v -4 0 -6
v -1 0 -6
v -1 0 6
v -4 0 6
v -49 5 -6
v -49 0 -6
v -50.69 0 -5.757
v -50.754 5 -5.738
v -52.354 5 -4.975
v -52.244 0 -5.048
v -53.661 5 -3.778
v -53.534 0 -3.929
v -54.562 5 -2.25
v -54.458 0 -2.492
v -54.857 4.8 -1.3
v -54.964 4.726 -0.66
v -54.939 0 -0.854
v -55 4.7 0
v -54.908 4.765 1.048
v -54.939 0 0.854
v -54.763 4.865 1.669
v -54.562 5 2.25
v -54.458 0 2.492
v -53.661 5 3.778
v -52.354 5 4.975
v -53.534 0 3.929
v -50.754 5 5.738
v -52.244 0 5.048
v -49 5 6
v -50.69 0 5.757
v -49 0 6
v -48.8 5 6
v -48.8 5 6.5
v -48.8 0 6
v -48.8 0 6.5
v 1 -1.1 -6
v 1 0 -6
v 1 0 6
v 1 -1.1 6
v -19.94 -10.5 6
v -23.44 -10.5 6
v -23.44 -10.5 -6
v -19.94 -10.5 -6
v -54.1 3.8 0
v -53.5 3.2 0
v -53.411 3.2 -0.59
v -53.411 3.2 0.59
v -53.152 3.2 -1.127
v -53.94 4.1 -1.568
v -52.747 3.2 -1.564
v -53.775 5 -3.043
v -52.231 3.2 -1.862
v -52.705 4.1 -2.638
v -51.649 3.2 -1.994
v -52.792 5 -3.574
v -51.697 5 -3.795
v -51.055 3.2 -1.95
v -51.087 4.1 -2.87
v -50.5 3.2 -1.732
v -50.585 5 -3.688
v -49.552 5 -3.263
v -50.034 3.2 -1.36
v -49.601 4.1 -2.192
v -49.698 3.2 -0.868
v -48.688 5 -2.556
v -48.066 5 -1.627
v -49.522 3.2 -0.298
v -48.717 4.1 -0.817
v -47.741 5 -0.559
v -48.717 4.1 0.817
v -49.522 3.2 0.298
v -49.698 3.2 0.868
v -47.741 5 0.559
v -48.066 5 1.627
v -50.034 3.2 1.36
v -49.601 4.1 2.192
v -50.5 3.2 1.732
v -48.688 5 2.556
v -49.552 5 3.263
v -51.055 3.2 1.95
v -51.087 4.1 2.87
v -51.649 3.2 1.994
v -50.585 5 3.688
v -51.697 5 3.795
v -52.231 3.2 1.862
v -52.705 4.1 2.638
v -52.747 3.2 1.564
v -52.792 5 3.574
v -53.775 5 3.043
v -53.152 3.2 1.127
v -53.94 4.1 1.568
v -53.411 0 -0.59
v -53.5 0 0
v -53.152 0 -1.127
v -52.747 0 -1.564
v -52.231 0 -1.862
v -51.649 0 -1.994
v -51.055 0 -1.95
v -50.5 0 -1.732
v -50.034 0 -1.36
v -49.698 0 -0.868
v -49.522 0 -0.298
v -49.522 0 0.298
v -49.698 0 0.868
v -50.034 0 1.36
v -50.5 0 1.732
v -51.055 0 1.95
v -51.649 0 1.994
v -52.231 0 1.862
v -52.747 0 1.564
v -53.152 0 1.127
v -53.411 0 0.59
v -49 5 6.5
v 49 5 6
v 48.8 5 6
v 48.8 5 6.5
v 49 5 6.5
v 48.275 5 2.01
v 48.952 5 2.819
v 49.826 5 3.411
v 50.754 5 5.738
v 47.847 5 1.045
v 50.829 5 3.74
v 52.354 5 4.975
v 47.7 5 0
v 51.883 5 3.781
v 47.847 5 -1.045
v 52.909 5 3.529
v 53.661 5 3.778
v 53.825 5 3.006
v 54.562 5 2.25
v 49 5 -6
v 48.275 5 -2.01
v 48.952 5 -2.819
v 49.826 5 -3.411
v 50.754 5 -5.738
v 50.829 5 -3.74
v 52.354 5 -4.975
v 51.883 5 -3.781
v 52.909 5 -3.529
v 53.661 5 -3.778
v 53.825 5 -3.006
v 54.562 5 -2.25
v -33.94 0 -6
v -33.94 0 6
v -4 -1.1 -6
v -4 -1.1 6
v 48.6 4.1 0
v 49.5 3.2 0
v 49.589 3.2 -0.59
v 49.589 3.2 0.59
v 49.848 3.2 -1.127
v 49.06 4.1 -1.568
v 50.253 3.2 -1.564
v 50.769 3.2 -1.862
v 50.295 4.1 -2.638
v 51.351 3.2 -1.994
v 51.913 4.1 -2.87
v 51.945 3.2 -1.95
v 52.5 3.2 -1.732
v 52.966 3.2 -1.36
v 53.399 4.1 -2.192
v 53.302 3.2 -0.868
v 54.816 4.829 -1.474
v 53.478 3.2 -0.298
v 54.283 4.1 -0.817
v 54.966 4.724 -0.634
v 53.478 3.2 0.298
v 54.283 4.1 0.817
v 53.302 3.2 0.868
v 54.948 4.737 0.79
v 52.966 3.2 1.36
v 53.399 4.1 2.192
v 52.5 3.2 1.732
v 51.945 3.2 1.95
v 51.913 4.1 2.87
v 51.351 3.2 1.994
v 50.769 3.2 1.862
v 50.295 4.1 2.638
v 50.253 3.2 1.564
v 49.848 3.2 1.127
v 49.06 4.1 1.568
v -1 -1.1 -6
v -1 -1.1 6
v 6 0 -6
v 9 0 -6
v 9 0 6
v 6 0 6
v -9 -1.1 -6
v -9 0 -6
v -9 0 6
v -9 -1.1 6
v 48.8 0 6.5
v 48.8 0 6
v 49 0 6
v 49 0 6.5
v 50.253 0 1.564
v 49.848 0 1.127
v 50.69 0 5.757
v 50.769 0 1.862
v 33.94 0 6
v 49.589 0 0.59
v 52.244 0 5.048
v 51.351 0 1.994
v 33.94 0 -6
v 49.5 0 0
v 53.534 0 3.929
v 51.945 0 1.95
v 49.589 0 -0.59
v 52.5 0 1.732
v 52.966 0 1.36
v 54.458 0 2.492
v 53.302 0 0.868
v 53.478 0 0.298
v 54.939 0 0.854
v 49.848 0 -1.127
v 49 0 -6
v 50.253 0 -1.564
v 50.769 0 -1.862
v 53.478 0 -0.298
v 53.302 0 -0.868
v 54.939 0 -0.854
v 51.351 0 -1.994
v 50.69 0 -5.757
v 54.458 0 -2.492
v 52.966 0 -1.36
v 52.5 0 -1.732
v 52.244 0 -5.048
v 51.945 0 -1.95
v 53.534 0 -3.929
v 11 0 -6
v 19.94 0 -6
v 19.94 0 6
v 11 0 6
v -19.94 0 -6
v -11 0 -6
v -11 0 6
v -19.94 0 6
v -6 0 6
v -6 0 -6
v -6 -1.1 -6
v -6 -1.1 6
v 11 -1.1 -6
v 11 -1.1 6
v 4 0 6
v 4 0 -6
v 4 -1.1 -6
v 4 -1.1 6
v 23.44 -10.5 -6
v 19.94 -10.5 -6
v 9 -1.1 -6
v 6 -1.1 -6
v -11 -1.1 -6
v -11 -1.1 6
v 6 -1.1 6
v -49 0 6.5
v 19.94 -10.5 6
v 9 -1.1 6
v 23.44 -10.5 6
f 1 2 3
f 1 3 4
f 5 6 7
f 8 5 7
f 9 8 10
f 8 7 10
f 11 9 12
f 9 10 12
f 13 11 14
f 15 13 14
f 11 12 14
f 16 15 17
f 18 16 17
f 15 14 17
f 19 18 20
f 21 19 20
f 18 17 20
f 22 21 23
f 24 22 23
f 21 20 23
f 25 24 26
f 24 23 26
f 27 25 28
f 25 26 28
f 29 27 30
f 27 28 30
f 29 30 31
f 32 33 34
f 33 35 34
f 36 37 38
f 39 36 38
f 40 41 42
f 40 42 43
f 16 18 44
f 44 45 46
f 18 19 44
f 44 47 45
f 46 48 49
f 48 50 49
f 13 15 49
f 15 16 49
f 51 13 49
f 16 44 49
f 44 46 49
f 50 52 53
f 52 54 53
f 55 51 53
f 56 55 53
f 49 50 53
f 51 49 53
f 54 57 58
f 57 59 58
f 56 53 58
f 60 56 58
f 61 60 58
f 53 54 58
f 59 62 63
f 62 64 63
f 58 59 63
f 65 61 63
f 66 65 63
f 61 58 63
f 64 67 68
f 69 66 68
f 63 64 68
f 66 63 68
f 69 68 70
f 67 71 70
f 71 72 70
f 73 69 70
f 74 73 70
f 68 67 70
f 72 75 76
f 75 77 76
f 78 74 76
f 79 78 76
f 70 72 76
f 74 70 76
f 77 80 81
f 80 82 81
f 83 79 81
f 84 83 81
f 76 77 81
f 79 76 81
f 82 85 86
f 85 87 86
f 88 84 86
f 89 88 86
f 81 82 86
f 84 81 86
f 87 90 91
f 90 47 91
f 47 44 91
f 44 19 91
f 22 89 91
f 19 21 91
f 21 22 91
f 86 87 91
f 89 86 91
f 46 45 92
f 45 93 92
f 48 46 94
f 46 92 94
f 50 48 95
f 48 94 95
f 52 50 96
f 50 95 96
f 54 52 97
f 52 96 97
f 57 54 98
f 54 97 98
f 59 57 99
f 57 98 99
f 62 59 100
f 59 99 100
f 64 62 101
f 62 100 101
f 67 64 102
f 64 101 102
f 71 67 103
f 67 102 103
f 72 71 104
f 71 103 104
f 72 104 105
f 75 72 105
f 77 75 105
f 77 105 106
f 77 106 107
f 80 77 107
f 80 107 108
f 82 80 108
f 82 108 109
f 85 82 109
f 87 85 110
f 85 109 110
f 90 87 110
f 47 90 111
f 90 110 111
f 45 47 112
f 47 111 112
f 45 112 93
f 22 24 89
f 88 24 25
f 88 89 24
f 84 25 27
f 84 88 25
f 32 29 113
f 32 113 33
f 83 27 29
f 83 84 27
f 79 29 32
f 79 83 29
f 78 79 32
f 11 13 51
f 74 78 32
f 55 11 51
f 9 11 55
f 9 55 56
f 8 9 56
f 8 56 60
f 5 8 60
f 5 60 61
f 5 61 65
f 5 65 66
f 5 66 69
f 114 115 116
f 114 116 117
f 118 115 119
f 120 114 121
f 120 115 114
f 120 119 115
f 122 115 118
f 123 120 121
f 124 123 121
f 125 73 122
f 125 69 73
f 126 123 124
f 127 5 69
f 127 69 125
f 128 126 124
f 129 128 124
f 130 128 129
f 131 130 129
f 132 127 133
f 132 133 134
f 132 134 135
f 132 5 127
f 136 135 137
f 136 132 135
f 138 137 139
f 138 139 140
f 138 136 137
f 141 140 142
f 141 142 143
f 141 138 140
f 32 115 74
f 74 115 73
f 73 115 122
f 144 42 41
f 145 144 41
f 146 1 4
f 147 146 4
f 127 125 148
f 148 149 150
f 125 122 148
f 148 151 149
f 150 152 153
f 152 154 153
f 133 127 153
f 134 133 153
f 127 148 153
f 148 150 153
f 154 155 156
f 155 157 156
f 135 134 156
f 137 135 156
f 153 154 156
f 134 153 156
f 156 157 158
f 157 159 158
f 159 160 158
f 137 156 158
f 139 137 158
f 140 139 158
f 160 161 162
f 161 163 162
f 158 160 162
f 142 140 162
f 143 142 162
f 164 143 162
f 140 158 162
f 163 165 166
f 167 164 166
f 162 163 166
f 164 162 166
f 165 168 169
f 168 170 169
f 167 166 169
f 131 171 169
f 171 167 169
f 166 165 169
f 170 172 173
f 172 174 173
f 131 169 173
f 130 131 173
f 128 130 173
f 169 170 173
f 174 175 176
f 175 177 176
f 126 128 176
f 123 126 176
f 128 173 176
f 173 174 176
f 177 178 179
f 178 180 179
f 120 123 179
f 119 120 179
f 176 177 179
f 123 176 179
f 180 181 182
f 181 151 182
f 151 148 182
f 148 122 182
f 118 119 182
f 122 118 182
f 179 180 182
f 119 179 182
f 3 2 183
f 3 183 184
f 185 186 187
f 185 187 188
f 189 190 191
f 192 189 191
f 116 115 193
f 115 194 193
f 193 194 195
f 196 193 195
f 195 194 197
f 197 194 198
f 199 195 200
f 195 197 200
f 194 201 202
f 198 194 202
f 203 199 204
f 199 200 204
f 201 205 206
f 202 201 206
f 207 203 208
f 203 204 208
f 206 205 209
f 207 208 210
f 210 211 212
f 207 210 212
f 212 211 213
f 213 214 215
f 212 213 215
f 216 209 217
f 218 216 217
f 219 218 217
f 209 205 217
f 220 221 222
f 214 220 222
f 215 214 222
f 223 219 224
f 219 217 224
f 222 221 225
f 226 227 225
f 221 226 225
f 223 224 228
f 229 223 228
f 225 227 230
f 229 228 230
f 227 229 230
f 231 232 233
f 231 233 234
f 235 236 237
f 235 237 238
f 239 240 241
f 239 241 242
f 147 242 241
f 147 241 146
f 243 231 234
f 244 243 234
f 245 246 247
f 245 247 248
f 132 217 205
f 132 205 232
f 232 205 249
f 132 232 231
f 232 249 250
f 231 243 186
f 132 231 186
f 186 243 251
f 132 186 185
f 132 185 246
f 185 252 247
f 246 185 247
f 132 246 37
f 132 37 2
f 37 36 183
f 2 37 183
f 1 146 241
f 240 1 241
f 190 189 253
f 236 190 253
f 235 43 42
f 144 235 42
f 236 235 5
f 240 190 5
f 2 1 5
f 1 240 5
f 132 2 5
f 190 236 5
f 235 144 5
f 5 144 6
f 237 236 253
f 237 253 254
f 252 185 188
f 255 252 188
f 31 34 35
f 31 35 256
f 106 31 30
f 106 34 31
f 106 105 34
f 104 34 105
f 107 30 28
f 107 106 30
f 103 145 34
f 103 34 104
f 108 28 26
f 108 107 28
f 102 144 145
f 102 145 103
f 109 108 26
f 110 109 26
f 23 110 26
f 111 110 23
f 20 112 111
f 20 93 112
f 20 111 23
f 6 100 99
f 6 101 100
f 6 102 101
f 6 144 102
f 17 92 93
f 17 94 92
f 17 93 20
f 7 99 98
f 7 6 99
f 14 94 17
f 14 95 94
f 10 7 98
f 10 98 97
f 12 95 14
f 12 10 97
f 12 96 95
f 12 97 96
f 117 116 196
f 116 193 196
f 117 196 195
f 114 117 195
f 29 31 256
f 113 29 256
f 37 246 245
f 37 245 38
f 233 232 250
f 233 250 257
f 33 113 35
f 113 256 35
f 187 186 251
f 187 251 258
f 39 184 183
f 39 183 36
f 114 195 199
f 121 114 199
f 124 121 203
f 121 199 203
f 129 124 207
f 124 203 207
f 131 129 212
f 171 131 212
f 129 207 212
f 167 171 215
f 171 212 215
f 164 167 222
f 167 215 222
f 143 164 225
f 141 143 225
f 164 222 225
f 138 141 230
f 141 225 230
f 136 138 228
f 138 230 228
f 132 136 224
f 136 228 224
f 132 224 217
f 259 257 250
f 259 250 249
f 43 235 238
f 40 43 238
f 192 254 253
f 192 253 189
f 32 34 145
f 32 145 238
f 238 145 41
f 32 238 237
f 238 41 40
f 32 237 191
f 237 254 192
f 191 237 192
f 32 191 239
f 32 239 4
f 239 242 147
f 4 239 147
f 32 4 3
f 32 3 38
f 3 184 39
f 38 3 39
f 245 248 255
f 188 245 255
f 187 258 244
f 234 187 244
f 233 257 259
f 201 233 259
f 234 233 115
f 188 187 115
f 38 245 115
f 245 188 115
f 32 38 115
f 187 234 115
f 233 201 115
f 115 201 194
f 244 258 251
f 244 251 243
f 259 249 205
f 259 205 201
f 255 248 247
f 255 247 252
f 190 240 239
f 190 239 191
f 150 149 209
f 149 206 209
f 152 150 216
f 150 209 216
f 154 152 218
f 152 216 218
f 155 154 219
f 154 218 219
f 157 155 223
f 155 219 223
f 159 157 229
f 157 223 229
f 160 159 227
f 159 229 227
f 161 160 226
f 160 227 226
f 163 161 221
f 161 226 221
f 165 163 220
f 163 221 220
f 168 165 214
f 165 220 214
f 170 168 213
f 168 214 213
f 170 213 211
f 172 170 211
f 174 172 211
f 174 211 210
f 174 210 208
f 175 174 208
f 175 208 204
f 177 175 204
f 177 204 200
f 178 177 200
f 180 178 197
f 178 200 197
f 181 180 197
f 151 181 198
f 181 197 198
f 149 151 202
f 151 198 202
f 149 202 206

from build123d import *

# Parameters (mm, degrees)
SKETCH1_R                     = 1.5
BOSS_EXTRUDE1_DEPTH           = 3
SKETCH4_W                     = 3.5
SKETCH4_H                     = 12
BOSS_EXTRUDE3_DEPTH           = 10.5
SKETCH5_W                     = 2
SKETCH5_H                     = 12
BOSS_EXTRUDE4_DEPTH           = 1.1
SKETCH6_W                     = 0.2
SKETCH6_H                     = 3
BOSS_EXTRUDE5_DEPTH           = 0.5
CHAMFER1_SIZE                 = 10.5
SKETCH10_R                    = 1.5
BOSS_EXTRUDE6_DEPTH           = 2
CSK_FOR_M4_SFHCS1_D           = 4
CSK_FOR_M4_SFHCS1_DEPTH       = 30.798278762
CSK_FOR_M4_SFHCS1_CSINK_D     = 7.6
CSK_FOR_M4_SFHCS1_CSINK_ANGLE = 90
CSK_FOR_M4_SFHCS1_TIP         = 1.201721238


with BuildPart() as part:
    # Sketch1 → Boss-Extrude1 (new body)
    with BuildSketch(Plane(origin=(0, 0, 0), x_dir=(1, 0, 0), z_dir=(0, 1, 0))):
        with BuildLine():
            Line((-49, 6), (49, 6))
            ThreePointArc((49, 6), (55, 0), (49, -6))
            Line((49, -6), (-49, -6))
            ThreePointArc((-49, -6), (-55, 0), (-49, 6))
        make_face()
        with Locations(Location((-51.5, 0, 0), (0, 0, 270))):
            Circle(SKETCH1_R, mode=Mode.SUBTRACT)
        with Locations(Location((51.5, 0, 0), (0, 0, 270))):
            Circle(SKETCH1_R, mode=Mode.SUBTRACT)
    extrude(amount=BOSS_EXTRUDE1_DEPTH)

    # Sketch4 → Boss-Extrude3 (add)
    with BuildSketch(Plane.XZ):
        with Locations((-21.690023983, 0)):
            Rectangle(SKETCH4_W, SKETCH4_H)
        with Locations((21.690023983, 0)):
            Rectangle(SKETCH4_W, SKETCH4_H)
    extrude(amount=BOSS_EXTRUDE3_DEPTH)

    # Sketch5 → Boss-Extrude4 (add)
    with BuildSketch(Plane.XZ):
        with Locations((5, 0)):
            Rectangle(SKETCH5_W, SKETCH5_H)
        Rectangle(SKETCH5_W, SKETCH5_H)
        with Locations((10, 0)):
            Rectangle(SKETCH5_W, SKETCH5_H)
        with Locations((-5, 0)):
            Rectangle(SKETCH5_W, SKETCH5_H)
        with Locations((-10, 0)):
            Rectangle(SKETCH5_W, SKETCH5_H)
    extrude(amount=BOSS_EXTRUDE4_DEPTH)

    # Sketch6 → Boss-Extrude5 (add)
    with BuildSketch(Plane.XY.offset(6)):
        with Locations((48.9, 1.5)):
            Rectangle(SKETCH6_W, SKETCH6_H)
        with Locations((-48.9, 1.5)):
            Rectangle(SKETCH6_W, SKETCH6_H)
    extrude(amount=BOSS_EXTRUDE5_DEPTH)

    # Chamfer1
    chamfer1_edges = [part.edges().sort_by_distance(p)[0] for p in [
        (-23.440023983, 0, 0),
        (23.440023983, 0, 0),
    ]]
    chamfer(chamfer1_edges, length=CHAMFER1_SIZE - 0.0001)  # a hair under: the kernel refuses the full size

    # Sketch10 → Boss-Extrude6 (add)
    with BuildSketch(Plane(origin=(0, 3, 0), x_dir=(1, 0, 0), z_dir=(0, 1, 0))):
        with BuildLine():
            Line((-49, -6), (-49, -6.5))
            Line((-49, -6.5), (-48.8, -6.5))
            Line((-48.8, -6.5), (-48.8, -6))
            Line((-48.8, -6), (48.8, -6))
            Line((48.8, -6), (48.8, -6.5))
            Line((48.8, -6.5), (49, -6.5))
            Line((49, -6.5), (49, -6))
            ThreePointArc((49, -6), (55, 0), (49, 6))
            Line((49, 6), (-49, 6))
            ThreePointArc((-49, 6), (-55, 0), (-49, -6))
        make_face()
        with Locations(Location((-51.5, 0, 0), (0, 0, 270))):
            Circle(SKETCH10_R, mode=Mode.SUBTRACT)
        with Locations(Location((51.5, 0, 0), (0, 0, 270))):
            Circle(SKETCH10_R, mode=Mode.SUBTRACT)
    extrude(amount=BOSS_EXTRUDE6_DEPTH)

    # CSK for M4 SFHCS1
    with Locations(Plane(origin=(0, 5, 0), x_dir=(1, 0, 0), z_dir=(0, 1, 0))):
        with Locations((51.5, 0), (-51.5, 0)):
            CounterSinkHole(CSK_FOR_M4_SFHCS1_D / 2, CSK_FOR_M4_SFHCS1_CSINK_D / 2, depth=CSK_FOR_M4_SFHCS1_DEPTH, counter_sink_angle=CSK_FOR_M4_SFHCS1_CSINK_ANGLE)
            with Locations((0, 0, -(CSK_FOR_M4_SFHCS1_DEPTH + CSK_FOR_M4_SFHCS1_TIP / 2))):  # 118° drill point
                Cone(0, CSK_FOR_M4_SFHCS1_D / 2, CSK_FOR_M4_SFHCS1_TIP, mode=Mode.SUBTRACT)


solid = part.part
